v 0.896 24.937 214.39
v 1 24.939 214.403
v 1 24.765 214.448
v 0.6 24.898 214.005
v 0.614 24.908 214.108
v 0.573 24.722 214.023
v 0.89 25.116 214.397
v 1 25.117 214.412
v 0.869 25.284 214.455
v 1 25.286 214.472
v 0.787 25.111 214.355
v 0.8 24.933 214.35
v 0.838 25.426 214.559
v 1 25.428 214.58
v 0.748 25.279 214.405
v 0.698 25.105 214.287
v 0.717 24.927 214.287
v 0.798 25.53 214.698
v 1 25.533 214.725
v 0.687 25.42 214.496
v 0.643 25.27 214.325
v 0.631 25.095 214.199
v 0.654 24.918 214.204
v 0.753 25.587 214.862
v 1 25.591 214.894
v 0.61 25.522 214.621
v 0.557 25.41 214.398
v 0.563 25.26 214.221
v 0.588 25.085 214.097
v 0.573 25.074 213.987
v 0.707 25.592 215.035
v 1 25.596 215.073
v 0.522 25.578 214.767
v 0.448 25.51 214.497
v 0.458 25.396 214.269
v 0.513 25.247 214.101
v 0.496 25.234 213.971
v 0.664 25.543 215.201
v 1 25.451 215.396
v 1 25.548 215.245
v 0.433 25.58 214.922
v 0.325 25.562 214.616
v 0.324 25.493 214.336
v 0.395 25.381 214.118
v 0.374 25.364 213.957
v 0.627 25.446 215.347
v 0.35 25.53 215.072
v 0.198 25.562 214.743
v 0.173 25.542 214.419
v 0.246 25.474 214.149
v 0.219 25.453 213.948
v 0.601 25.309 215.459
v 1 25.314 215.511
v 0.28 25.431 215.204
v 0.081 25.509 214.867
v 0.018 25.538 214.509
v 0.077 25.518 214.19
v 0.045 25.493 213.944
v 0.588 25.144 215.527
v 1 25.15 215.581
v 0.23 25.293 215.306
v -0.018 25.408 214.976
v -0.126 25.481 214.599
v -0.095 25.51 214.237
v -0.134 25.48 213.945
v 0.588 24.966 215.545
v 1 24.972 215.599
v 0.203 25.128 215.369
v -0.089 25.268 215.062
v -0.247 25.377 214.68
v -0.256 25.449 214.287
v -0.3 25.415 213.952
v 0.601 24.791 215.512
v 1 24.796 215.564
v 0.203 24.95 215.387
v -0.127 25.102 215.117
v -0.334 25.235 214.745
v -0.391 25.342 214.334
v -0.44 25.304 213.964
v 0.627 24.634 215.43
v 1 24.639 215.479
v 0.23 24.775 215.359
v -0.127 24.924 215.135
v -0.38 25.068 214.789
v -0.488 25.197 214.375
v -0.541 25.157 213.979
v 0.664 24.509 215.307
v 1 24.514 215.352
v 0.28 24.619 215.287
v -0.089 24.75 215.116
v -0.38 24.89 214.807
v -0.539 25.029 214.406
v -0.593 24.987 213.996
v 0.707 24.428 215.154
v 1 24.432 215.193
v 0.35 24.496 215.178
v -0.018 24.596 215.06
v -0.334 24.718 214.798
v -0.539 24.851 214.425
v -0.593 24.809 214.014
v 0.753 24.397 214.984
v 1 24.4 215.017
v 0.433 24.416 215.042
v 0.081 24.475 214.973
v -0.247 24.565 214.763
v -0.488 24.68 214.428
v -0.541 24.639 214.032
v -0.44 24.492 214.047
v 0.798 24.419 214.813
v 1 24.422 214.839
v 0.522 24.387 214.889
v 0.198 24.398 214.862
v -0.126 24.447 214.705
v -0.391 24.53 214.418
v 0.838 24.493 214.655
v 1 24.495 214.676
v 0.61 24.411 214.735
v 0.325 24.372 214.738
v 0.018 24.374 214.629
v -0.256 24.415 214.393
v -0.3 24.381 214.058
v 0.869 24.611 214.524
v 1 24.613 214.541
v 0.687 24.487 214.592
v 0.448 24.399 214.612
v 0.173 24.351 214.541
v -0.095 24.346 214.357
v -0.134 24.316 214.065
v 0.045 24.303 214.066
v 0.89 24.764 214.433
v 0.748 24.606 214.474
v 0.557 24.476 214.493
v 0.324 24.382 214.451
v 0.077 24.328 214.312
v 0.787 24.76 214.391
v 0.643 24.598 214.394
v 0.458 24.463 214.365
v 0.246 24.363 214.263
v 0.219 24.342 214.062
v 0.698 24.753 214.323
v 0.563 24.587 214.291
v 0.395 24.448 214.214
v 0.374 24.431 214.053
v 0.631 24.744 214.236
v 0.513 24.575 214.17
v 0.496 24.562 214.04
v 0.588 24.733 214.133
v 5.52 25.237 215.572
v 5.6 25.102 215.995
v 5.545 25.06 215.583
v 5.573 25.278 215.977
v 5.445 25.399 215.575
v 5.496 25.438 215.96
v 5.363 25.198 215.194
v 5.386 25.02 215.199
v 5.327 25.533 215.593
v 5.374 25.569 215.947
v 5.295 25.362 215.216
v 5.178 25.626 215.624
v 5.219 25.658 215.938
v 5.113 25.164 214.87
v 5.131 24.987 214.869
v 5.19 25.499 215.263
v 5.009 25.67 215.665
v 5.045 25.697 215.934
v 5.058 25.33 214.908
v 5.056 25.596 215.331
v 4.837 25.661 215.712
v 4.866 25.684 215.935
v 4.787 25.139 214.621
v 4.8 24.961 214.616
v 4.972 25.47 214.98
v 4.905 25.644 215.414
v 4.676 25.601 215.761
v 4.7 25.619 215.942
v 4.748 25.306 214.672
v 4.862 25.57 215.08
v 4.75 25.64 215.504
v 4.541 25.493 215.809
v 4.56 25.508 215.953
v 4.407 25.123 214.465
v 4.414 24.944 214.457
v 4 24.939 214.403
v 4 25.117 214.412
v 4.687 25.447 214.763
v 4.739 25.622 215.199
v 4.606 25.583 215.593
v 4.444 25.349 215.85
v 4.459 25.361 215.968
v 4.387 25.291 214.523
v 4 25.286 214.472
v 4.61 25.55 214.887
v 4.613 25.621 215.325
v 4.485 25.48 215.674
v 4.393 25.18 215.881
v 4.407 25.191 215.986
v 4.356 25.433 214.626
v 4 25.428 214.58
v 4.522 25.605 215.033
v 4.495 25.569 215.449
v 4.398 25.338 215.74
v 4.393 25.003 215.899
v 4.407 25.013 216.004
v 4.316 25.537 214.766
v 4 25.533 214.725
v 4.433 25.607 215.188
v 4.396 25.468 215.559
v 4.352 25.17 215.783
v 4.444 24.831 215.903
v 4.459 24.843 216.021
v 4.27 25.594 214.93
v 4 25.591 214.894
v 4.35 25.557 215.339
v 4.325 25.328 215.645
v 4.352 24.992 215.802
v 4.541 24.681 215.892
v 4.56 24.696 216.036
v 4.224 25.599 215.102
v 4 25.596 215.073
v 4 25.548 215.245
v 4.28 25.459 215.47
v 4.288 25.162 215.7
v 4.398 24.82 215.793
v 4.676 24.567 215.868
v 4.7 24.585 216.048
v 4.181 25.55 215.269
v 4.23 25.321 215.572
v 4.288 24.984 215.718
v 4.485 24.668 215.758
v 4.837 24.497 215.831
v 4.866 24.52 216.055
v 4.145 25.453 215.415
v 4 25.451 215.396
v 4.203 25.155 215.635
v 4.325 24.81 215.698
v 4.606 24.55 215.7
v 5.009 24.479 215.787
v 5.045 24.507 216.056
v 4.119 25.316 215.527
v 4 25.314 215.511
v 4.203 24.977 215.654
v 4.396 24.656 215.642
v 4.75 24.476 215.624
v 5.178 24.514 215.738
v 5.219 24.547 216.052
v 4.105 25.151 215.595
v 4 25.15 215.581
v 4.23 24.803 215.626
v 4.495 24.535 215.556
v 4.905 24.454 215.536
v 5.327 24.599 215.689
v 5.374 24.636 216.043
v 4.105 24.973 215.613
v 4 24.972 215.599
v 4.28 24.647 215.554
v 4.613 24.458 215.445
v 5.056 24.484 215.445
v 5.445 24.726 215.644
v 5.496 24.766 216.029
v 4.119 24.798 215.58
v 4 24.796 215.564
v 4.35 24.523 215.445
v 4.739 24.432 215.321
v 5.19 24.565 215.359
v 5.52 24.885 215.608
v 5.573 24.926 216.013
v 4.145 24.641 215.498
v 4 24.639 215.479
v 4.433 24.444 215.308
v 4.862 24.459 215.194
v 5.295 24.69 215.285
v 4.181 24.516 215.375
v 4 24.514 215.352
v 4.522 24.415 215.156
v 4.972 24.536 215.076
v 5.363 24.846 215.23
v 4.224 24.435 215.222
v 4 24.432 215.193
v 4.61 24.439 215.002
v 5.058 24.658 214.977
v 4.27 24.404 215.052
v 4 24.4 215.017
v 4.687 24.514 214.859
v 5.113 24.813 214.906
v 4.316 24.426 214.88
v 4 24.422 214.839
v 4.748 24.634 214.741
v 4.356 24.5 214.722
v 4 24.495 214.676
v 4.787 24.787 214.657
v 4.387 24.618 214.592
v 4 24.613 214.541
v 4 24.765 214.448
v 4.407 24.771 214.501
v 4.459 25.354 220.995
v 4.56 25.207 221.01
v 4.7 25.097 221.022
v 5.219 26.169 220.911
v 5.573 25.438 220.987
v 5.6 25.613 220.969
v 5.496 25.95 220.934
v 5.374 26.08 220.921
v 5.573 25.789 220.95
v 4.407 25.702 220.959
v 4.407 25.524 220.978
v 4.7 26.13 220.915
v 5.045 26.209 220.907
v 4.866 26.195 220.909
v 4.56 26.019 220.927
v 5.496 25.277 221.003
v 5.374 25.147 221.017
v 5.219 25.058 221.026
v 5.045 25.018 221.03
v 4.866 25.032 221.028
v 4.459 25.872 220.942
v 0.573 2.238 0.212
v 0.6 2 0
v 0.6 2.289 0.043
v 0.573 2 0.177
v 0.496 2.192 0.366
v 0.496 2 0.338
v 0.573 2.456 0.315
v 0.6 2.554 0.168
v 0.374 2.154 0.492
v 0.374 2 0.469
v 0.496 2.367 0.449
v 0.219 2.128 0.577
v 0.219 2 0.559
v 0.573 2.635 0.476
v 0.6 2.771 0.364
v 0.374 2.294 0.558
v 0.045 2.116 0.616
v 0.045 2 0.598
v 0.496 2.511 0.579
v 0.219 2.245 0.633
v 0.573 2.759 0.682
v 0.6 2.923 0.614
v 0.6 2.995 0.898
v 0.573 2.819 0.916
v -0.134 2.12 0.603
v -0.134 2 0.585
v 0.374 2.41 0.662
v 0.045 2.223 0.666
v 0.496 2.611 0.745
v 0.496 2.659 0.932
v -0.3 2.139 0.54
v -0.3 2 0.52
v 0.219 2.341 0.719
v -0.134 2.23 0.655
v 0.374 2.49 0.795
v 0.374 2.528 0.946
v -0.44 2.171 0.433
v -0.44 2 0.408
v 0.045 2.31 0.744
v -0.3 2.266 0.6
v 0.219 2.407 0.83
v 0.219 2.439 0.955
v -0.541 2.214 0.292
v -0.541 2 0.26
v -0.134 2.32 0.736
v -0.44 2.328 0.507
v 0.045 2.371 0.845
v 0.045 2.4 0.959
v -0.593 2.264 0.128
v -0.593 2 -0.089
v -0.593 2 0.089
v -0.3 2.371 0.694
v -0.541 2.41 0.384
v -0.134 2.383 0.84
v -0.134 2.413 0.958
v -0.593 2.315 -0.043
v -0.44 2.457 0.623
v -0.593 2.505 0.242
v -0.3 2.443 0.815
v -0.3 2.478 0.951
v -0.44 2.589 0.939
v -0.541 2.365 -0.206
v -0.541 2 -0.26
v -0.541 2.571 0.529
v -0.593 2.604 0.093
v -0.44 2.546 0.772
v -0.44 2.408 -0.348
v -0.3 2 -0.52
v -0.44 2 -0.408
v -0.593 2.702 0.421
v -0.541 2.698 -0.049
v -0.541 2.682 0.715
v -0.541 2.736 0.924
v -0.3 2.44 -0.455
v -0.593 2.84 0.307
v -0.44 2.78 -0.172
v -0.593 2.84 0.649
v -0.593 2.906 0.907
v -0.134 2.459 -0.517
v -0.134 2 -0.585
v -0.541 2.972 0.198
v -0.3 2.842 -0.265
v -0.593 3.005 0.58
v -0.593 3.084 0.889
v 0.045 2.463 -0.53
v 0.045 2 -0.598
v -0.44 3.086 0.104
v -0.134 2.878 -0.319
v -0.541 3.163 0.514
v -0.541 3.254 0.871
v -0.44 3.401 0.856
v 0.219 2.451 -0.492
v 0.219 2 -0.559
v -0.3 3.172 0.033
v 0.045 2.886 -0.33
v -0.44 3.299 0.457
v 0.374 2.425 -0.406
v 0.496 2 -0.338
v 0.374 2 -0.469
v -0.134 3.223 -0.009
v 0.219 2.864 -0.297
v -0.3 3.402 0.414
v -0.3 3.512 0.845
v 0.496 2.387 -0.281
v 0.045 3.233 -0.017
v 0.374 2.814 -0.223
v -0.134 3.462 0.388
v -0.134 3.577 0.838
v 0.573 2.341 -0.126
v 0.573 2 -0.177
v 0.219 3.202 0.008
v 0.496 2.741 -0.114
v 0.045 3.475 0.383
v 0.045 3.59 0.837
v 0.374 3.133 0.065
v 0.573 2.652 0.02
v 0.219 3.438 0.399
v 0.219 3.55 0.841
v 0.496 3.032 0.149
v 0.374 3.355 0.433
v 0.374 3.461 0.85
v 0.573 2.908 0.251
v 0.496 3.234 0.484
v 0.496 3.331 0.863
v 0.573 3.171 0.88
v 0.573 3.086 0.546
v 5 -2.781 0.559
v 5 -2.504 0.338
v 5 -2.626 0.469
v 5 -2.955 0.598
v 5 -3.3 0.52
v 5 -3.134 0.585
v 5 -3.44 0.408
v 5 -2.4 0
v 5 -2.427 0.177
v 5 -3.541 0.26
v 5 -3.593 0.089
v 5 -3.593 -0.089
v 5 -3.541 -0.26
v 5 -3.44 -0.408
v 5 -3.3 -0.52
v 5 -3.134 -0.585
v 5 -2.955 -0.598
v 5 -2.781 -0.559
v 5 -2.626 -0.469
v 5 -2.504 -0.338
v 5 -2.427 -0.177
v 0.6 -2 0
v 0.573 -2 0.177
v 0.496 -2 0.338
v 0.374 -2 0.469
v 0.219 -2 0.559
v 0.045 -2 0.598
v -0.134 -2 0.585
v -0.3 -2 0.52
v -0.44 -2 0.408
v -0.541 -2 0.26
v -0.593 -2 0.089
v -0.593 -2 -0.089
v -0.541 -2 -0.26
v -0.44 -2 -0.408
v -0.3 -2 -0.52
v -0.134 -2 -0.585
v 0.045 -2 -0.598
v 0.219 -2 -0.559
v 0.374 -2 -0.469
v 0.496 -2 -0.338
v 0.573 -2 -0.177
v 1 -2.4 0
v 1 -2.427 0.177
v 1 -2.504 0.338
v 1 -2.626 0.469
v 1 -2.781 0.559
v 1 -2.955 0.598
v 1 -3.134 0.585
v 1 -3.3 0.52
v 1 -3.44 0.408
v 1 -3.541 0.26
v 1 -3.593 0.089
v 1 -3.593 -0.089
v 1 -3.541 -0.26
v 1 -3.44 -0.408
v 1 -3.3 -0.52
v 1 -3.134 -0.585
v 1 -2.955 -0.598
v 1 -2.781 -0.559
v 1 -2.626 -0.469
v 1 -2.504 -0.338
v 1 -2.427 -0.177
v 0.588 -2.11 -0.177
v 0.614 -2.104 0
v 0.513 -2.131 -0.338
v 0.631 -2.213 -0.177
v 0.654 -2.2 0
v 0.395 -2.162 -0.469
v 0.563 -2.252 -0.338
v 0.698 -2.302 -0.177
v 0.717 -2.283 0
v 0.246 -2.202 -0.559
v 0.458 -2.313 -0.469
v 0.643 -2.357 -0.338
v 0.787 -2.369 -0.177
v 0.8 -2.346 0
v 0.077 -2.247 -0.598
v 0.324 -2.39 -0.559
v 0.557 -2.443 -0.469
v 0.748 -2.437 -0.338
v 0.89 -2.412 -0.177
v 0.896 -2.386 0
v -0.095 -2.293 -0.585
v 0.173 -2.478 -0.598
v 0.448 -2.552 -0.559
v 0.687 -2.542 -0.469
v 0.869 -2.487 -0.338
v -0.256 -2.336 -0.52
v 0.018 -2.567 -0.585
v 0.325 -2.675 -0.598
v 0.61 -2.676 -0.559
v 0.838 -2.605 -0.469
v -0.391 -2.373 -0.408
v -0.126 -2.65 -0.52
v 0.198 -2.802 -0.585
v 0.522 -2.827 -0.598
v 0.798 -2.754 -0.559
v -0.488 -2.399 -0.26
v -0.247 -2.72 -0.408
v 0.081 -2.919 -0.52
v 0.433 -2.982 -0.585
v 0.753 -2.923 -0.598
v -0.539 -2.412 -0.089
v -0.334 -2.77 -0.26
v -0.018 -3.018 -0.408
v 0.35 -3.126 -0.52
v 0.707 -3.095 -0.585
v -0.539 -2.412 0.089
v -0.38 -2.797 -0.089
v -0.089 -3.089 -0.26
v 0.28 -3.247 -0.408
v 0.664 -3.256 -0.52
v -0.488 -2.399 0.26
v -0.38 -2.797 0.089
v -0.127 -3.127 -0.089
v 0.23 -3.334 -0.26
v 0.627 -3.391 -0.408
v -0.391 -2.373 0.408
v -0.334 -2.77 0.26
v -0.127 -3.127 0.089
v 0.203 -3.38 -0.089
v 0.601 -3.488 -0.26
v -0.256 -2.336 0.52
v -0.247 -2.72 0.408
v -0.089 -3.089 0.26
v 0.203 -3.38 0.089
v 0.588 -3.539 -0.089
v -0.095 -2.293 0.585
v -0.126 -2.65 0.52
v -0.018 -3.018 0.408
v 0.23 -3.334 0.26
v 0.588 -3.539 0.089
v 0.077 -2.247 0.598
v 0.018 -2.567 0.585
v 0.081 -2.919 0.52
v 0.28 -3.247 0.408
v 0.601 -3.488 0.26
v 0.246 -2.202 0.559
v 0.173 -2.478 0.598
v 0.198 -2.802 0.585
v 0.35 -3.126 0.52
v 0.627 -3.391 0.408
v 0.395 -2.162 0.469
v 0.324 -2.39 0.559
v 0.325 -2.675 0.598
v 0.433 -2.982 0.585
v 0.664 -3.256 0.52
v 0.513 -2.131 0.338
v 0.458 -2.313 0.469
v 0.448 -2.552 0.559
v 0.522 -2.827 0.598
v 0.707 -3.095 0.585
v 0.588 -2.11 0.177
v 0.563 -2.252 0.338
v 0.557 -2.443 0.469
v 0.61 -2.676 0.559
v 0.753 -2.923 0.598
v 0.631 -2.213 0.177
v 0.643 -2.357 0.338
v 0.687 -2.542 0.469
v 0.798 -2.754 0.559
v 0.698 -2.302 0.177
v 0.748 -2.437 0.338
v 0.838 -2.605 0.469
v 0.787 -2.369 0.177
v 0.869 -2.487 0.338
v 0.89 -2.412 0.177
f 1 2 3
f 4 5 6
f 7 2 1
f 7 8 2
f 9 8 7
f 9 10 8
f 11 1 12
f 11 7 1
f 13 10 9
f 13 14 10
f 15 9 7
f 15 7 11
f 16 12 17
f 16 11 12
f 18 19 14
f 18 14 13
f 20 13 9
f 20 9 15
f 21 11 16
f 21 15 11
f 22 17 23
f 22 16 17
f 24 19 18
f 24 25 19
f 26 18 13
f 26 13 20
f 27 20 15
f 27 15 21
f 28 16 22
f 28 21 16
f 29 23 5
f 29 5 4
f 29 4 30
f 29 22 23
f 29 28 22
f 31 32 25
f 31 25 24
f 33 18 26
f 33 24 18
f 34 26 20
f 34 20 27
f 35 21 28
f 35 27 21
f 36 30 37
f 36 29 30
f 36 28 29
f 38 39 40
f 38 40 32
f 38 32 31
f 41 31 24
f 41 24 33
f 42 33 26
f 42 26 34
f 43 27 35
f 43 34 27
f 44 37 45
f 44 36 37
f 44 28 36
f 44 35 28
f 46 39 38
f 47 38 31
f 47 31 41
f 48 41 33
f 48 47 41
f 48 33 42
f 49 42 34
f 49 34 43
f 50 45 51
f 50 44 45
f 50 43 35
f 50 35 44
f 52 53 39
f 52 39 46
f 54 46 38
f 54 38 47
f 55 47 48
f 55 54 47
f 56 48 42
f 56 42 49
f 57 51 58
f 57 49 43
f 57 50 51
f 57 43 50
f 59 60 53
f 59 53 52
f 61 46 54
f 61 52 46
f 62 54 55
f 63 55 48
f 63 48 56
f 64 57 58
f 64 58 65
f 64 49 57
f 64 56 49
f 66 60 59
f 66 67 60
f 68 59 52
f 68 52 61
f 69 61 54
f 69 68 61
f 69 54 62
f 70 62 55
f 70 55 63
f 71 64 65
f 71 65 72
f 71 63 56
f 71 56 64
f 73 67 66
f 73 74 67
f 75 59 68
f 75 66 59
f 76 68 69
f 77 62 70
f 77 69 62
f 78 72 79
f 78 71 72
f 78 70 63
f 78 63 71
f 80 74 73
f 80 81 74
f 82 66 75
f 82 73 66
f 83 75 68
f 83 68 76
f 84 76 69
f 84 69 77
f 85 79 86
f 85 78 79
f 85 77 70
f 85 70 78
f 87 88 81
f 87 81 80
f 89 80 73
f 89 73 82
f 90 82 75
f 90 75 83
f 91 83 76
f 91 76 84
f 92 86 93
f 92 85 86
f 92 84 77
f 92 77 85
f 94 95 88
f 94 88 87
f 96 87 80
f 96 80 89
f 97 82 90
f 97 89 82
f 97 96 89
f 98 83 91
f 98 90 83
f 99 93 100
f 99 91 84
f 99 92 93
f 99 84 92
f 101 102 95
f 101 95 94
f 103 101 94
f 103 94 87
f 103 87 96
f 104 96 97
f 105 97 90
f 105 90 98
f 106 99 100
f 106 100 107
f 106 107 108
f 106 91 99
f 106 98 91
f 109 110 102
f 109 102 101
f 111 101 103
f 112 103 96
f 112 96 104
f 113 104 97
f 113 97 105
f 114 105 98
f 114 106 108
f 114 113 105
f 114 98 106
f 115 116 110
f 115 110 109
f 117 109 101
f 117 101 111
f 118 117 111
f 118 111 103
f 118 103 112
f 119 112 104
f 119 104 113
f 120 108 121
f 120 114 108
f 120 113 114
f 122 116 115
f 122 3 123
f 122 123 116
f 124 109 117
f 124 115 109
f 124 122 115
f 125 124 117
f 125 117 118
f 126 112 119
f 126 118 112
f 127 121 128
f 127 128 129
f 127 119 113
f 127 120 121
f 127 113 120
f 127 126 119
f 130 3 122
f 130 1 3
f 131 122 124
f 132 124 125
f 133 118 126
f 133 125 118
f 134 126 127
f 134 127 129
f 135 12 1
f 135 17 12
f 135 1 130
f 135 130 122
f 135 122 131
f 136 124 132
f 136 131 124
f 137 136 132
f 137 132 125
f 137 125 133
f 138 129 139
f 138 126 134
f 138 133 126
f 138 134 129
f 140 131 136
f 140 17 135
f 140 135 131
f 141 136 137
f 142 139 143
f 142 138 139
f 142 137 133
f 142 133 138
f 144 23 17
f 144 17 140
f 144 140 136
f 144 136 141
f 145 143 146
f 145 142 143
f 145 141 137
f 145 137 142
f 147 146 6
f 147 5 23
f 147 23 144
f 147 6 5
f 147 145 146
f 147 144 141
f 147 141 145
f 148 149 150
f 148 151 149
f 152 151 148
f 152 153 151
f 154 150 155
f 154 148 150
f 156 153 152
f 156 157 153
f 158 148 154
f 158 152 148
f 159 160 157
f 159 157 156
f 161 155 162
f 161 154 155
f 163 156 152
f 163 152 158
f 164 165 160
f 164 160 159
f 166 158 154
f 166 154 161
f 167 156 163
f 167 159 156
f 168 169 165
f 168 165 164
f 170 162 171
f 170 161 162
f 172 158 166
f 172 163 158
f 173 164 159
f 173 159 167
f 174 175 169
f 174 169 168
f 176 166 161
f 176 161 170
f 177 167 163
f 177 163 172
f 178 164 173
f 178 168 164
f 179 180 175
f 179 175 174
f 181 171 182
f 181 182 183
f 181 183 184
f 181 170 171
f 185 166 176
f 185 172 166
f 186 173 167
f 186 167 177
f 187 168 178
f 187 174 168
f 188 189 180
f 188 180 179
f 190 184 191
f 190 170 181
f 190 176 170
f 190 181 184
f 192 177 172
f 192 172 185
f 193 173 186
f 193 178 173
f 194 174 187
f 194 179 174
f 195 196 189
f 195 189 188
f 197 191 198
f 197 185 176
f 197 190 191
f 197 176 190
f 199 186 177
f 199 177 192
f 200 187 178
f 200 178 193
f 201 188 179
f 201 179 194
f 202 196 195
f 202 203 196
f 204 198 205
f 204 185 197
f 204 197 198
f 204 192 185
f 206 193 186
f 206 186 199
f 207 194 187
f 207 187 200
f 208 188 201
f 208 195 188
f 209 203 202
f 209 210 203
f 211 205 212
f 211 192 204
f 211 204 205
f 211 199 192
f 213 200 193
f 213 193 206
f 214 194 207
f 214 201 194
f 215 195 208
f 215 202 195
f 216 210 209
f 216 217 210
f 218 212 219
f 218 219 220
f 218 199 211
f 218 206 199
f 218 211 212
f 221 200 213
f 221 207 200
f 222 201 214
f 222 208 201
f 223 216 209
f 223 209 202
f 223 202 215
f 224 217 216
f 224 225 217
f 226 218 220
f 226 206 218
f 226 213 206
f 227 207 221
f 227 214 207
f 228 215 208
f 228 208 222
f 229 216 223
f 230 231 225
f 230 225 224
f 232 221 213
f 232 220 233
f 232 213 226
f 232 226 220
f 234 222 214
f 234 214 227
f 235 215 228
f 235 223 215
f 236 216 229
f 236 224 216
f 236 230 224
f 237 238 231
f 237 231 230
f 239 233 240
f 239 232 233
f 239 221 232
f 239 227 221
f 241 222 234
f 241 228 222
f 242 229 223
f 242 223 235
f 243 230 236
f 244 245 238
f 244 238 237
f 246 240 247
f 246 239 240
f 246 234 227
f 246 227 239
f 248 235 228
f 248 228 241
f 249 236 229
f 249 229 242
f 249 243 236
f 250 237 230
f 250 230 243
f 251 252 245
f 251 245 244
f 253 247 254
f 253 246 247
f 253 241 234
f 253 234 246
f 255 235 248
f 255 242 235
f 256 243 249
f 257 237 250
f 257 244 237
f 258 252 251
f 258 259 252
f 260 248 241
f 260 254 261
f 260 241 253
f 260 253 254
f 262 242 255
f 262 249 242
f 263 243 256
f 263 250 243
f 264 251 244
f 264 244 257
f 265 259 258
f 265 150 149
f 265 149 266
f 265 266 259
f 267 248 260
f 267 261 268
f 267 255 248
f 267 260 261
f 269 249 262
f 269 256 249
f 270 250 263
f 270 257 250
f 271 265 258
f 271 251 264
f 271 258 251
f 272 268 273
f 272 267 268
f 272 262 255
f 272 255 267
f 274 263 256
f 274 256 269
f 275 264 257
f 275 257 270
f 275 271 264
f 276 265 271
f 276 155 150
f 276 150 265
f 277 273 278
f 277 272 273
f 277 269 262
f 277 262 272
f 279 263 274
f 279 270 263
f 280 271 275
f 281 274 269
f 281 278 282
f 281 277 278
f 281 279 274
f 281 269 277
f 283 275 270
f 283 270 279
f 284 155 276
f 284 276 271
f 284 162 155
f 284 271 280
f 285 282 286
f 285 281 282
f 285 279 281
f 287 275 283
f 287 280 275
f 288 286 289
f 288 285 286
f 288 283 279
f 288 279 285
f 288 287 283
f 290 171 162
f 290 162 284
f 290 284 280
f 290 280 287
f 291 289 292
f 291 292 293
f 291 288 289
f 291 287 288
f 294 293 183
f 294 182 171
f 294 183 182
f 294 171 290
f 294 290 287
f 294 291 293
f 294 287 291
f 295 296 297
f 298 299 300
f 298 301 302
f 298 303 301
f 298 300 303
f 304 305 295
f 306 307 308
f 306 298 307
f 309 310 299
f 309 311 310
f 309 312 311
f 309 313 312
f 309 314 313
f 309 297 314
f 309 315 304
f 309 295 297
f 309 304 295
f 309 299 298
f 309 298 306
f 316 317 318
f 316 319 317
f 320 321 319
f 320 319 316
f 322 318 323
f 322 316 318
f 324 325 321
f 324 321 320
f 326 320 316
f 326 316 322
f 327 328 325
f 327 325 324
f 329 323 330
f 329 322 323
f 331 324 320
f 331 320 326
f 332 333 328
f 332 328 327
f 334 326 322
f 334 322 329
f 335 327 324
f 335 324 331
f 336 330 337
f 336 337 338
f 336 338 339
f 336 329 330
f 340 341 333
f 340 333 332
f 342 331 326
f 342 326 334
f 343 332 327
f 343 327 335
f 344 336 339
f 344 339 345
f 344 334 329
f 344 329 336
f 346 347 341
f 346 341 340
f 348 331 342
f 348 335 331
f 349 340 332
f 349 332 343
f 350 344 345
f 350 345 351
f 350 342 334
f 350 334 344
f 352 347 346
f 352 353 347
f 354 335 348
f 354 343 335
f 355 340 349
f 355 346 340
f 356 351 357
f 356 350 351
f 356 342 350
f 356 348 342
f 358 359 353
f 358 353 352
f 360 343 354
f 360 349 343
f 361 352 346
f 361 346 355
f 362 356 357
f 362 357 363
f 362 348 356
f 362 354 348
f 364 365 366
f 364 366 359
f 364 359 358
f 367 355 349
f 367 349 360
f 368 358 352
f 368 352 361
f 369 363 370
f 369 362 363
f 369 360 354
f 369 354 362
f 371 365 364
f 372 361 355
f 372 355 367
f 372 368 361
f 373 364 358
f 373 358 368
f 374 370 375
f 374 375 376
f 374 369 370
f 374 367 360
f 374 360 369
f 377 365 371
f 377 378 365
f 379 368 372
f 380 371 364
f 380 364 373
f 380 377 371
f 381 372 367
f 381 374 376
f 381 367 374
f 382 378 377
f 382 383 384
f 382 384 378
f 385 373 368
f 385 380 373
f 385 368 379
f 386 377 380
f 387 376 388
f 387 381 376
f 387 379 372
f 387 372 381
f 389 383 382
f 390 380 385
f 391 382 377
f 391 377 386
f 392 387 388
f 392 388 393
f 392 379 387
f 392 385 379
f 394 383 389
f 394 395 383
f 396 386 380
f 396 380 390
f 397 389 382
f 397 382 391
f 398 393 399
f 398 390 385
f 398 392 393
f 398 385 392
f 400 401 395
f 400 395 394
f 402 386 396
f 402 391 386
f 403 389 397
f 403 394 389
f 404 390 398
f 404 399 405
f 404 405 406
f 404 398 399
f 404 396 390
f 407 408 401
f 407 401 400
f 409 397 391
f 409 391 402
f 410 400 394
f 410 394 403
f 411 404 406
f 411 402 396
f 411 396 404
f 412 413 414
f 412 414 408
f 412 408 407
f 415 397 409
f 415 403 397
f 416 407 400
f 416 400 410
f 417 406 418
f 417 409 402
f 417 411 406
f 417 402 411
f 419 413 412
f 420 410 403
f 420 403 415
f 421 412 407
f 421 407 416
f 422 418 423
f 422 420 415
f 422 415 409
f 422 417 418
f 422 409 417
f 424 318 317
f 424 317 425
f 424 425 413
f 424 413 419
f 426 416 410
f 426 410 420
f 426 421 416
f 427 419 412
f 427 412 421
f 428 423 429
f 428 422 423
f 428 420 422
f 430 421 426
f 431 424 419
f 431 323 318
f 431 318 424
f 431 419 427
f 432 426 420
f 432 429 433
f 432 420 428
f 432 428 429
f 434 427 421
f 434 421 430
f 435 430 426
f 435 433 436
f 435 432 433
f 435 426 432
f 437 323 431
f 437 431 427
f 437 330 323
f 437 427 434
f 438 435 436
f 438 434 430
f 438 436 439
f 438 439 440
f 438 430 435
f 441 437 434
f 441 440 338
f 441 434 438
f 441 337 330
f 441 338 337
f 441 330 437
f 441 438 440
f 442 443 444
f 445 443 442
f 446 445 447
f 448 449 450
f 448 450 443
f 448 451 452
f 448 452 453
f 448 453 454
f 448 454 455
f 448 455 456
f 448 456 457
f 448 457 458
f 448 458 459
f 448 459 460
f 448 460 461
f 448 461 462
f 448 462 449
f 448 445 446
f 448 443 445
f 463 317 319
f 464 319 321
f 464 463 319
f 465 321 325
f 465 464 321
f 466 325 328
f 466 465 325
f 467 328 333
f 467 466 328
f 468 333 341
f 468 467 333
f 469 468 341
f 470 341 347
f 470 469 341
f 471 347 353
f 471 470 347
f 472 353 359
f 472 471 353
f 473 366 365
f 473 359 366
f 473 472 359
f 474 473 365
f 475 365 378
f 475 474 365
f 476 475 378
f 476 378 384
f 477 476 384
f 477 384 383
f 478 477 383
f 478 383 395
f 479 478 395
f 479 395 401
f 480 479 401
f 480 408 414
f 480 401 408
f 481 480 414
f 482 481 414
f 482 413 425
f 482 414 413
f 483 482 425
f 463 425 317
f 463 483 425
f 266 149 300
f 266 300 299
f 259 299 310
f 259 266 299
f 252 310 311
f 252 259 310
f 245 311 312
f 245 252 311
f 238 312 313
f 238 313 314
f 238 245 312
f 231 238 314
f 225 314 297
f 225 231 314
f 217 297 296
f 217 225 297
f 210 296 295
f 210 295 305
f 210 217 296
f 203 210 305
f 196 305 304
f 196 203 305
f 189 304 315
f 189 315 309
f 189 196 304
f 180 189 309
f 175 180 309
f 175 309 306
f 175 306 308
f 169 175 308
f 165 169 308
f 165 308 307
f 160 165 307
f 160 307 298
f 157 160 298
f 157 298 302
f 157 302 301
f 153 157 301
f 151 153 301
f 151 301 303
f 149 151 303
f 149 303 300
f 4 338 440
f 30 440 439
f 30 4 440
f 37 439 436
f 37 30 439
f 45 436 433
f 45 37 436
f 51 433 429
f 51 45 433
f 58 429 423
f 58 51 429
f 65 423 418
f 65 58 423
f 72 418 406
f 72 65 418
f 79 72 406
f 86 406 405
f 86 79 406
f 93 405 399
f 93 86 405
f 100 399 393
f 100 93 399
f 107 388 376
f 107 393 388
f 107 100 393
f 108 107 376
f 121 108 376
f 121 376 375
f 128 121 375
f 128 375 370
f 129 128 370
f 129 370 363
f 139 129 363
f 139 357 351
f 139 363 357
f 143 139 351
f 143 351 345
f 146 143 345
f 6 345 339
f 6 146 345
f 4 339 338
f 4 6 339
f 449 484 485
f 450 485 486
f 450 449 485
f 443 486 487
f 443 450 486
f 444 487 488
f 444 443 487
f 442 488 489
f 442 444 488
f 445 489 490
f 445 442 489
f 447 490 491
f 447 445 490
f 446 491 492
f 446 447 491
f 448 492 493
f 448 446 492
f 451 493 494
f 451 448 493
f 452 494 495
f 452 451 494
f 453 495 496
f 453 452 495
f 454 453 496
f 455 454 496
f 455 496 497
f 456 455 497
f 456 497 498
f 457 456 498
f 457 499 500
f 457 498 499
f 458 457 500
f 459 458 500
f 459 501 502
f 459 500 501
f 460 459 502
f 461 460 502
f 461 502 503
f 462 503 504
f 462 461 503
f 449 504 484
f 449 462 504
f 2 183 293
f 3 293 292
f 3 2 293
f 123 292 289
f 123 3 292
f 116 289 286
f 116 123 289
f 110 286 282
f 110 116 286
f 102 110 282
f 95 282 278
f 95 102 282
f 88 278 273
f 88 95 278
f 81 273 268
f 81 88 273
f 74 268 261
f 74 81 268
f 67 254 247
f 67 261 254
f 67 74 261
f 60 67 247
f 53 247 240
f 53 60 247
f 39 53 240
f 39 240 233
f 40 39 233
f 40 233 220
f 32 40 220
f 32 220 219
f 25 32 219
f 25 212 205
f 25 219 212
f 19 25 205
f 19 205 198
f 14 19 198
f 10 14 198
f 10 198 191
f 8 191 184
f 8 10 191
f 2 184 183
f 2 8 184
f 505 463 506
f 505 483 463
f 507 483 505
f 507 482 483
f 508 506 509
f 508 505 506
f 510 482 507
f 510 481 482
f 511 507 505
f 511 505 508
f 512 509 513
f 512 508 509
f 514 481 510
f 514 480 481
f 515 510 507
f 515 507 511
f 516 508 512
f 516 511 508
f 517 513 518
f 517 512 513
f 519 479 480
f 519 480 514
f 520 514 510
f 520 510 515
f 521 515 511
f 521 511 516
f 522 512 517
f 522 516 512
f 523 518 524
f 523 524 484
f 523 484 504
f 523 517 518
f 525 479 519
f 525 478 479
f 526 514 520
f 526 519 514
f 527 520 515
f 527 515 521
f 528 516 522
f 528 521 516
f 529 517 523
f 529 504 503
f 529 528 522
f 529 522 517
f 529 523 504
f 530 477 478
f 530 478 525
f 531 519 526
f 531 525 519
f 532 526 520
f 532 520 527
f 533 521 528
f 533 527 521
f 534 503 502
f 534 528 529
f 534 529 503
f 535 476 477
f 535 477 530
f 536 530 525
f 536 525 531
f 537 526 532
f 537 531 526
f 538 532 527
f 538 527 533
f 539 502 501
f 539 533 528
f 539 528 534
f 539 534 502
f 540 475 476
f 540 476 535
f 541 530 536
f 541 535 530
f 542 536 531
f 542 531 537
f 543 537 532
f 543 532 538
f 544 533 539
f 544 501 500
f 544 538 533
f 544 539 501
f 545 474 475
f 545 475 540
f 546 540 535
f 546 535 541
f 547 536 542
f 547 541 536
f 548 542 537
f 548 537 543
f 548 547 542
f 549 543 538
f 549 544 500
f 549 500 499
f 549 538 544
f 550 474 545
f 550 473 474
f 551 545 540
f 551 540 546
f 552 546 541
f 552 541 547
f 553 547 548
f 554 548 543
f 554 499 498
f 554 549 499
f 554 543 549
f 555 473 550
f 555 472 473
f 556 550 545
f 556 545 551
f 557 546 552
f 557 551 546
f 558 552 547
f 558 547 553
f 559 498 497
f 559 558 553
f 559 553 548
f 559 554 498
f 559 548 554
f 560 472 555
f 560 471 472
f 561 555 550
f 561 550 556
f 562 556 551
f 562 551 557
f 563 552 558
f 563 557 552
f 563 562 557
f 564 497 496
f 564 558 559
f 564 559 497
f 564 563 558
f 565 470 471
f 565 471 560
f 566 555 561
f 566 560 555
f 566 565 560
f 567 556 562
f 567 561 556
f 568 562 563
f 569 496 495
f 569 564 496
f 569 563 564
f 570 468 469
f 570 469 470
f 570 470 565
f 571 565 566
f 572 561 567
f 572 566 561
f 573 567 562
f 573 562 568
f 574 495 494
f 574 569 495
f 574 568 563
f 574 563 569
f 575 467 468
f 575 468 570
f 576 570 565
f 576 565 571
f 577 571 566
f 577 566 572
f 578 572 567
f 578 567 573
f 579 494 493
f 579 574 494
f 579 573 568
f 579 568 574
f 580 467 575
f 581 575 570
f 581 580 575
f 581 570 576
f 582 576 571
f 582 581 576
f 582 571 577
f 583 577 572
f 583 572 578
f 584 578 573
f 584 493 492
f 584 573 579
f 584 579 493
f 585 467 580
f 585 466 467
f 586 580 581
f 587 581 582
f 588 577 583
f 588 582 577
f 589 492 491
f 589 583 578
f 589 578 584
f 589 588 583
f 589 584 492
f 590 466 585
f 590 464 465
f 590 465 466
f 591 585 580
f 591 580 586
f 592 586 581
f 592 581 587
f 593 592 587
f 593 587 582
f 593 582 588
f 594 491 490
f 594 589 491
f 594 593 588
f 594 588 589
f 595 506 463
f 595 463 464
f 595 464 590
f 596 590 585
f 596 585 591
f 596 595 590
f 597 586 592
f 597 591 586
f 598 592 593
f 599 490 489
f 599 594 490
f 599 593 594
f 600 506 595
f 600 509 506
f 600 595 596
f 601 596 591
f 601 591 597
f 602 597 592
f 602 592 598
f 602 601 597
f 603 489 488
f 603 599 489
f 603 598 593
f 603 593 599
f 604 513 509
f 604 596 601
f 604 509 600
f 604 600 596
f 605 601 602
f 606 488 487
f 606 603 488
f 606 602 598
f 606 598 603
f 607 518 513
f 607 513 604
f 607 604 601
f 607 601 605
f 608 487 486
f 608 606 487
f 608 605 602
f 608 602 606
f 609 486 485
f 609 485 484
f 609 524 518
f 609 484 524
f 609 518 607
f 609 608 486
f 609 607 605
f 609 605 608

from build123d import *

# Parameters (mm, degrees)
SKETCH2_R  = 0.6
SKETCH6_R  = 0.6
SKETCH10_R = 0.6


with BuildPart() as part:
    # Sweep1: sweep along a path in Sketch1
    with BuildLine(Plane(origin=(0, 0, 0), x_dir=(0, 0, -1), z_dir=(1, 0, 0))) as sweep1_path:
        Line((0, 0), (0, 2))
        ThreePointArc((0, 2), (-0.257625253, 2.669984877), (-0.897759471, 2.994759707))
        Line((-0.897759471, 2.994759707), (-214.005240293, 24.897759471))
    # Sketch2 → Sweep1 (sweep)
    with BuildSketch(Plane(origin=(0, 0, 0), x_dir=(1, 0, 0), z_dir=(0, 1, 0))):
        Circle(SKETCH2_R)
    sweep(path=sweep1_path.line)

    # Sweep3: sweep along a path in Sketch4
    with BuildLine(Plane.XY) as sweep3_path:
        Line((0, 0), (0, -2))
        ThreePointArc((0, -2), (0.292893219, -2.707106781), (1, -3))
        Line((1, -3), (5, -3))
    # Sketch6 → Sweep3 (sweep)
    with BuildSketch(Plane.XZ):
        Circle(SKETCH6_R)
    sweep(path=sweep3_path.line)

    # Sweep4: sweep along a path in Sketch9
    with BuildLine(Plane(origin=(0, 2.872148696, -0.295196921), x_dir=(1, 0, 0), z_dir=(0, -0.994759707, 0.102240529))) as sweep4_path:
        Line((5, 222.429350183), (5, 217.429350183))
        ThreePointArc((5, 217.429350183), (4.707106781, 216.722243402), (4, 216.429350183))
        Line((4, 216.429350183), (1, 216.429350183))
        ThreePointArc((1, 216.429350183), (0.292893219, 216.136456964), (0, 215.429350183))
    # Sketch10 → Sweep4 (sweep)
    with BuildSketch(Plane(origin=(0, 22.025610775, 214.300437214), x_dir=(1, 0, 0), z_dir=(0, 0.102240529, 0.994759707))):
        with Locations((0, 2.887278884)):
            Circle(SKETCH10_R)
    sweep(path=sweep4_path.line)


solid = part.part
